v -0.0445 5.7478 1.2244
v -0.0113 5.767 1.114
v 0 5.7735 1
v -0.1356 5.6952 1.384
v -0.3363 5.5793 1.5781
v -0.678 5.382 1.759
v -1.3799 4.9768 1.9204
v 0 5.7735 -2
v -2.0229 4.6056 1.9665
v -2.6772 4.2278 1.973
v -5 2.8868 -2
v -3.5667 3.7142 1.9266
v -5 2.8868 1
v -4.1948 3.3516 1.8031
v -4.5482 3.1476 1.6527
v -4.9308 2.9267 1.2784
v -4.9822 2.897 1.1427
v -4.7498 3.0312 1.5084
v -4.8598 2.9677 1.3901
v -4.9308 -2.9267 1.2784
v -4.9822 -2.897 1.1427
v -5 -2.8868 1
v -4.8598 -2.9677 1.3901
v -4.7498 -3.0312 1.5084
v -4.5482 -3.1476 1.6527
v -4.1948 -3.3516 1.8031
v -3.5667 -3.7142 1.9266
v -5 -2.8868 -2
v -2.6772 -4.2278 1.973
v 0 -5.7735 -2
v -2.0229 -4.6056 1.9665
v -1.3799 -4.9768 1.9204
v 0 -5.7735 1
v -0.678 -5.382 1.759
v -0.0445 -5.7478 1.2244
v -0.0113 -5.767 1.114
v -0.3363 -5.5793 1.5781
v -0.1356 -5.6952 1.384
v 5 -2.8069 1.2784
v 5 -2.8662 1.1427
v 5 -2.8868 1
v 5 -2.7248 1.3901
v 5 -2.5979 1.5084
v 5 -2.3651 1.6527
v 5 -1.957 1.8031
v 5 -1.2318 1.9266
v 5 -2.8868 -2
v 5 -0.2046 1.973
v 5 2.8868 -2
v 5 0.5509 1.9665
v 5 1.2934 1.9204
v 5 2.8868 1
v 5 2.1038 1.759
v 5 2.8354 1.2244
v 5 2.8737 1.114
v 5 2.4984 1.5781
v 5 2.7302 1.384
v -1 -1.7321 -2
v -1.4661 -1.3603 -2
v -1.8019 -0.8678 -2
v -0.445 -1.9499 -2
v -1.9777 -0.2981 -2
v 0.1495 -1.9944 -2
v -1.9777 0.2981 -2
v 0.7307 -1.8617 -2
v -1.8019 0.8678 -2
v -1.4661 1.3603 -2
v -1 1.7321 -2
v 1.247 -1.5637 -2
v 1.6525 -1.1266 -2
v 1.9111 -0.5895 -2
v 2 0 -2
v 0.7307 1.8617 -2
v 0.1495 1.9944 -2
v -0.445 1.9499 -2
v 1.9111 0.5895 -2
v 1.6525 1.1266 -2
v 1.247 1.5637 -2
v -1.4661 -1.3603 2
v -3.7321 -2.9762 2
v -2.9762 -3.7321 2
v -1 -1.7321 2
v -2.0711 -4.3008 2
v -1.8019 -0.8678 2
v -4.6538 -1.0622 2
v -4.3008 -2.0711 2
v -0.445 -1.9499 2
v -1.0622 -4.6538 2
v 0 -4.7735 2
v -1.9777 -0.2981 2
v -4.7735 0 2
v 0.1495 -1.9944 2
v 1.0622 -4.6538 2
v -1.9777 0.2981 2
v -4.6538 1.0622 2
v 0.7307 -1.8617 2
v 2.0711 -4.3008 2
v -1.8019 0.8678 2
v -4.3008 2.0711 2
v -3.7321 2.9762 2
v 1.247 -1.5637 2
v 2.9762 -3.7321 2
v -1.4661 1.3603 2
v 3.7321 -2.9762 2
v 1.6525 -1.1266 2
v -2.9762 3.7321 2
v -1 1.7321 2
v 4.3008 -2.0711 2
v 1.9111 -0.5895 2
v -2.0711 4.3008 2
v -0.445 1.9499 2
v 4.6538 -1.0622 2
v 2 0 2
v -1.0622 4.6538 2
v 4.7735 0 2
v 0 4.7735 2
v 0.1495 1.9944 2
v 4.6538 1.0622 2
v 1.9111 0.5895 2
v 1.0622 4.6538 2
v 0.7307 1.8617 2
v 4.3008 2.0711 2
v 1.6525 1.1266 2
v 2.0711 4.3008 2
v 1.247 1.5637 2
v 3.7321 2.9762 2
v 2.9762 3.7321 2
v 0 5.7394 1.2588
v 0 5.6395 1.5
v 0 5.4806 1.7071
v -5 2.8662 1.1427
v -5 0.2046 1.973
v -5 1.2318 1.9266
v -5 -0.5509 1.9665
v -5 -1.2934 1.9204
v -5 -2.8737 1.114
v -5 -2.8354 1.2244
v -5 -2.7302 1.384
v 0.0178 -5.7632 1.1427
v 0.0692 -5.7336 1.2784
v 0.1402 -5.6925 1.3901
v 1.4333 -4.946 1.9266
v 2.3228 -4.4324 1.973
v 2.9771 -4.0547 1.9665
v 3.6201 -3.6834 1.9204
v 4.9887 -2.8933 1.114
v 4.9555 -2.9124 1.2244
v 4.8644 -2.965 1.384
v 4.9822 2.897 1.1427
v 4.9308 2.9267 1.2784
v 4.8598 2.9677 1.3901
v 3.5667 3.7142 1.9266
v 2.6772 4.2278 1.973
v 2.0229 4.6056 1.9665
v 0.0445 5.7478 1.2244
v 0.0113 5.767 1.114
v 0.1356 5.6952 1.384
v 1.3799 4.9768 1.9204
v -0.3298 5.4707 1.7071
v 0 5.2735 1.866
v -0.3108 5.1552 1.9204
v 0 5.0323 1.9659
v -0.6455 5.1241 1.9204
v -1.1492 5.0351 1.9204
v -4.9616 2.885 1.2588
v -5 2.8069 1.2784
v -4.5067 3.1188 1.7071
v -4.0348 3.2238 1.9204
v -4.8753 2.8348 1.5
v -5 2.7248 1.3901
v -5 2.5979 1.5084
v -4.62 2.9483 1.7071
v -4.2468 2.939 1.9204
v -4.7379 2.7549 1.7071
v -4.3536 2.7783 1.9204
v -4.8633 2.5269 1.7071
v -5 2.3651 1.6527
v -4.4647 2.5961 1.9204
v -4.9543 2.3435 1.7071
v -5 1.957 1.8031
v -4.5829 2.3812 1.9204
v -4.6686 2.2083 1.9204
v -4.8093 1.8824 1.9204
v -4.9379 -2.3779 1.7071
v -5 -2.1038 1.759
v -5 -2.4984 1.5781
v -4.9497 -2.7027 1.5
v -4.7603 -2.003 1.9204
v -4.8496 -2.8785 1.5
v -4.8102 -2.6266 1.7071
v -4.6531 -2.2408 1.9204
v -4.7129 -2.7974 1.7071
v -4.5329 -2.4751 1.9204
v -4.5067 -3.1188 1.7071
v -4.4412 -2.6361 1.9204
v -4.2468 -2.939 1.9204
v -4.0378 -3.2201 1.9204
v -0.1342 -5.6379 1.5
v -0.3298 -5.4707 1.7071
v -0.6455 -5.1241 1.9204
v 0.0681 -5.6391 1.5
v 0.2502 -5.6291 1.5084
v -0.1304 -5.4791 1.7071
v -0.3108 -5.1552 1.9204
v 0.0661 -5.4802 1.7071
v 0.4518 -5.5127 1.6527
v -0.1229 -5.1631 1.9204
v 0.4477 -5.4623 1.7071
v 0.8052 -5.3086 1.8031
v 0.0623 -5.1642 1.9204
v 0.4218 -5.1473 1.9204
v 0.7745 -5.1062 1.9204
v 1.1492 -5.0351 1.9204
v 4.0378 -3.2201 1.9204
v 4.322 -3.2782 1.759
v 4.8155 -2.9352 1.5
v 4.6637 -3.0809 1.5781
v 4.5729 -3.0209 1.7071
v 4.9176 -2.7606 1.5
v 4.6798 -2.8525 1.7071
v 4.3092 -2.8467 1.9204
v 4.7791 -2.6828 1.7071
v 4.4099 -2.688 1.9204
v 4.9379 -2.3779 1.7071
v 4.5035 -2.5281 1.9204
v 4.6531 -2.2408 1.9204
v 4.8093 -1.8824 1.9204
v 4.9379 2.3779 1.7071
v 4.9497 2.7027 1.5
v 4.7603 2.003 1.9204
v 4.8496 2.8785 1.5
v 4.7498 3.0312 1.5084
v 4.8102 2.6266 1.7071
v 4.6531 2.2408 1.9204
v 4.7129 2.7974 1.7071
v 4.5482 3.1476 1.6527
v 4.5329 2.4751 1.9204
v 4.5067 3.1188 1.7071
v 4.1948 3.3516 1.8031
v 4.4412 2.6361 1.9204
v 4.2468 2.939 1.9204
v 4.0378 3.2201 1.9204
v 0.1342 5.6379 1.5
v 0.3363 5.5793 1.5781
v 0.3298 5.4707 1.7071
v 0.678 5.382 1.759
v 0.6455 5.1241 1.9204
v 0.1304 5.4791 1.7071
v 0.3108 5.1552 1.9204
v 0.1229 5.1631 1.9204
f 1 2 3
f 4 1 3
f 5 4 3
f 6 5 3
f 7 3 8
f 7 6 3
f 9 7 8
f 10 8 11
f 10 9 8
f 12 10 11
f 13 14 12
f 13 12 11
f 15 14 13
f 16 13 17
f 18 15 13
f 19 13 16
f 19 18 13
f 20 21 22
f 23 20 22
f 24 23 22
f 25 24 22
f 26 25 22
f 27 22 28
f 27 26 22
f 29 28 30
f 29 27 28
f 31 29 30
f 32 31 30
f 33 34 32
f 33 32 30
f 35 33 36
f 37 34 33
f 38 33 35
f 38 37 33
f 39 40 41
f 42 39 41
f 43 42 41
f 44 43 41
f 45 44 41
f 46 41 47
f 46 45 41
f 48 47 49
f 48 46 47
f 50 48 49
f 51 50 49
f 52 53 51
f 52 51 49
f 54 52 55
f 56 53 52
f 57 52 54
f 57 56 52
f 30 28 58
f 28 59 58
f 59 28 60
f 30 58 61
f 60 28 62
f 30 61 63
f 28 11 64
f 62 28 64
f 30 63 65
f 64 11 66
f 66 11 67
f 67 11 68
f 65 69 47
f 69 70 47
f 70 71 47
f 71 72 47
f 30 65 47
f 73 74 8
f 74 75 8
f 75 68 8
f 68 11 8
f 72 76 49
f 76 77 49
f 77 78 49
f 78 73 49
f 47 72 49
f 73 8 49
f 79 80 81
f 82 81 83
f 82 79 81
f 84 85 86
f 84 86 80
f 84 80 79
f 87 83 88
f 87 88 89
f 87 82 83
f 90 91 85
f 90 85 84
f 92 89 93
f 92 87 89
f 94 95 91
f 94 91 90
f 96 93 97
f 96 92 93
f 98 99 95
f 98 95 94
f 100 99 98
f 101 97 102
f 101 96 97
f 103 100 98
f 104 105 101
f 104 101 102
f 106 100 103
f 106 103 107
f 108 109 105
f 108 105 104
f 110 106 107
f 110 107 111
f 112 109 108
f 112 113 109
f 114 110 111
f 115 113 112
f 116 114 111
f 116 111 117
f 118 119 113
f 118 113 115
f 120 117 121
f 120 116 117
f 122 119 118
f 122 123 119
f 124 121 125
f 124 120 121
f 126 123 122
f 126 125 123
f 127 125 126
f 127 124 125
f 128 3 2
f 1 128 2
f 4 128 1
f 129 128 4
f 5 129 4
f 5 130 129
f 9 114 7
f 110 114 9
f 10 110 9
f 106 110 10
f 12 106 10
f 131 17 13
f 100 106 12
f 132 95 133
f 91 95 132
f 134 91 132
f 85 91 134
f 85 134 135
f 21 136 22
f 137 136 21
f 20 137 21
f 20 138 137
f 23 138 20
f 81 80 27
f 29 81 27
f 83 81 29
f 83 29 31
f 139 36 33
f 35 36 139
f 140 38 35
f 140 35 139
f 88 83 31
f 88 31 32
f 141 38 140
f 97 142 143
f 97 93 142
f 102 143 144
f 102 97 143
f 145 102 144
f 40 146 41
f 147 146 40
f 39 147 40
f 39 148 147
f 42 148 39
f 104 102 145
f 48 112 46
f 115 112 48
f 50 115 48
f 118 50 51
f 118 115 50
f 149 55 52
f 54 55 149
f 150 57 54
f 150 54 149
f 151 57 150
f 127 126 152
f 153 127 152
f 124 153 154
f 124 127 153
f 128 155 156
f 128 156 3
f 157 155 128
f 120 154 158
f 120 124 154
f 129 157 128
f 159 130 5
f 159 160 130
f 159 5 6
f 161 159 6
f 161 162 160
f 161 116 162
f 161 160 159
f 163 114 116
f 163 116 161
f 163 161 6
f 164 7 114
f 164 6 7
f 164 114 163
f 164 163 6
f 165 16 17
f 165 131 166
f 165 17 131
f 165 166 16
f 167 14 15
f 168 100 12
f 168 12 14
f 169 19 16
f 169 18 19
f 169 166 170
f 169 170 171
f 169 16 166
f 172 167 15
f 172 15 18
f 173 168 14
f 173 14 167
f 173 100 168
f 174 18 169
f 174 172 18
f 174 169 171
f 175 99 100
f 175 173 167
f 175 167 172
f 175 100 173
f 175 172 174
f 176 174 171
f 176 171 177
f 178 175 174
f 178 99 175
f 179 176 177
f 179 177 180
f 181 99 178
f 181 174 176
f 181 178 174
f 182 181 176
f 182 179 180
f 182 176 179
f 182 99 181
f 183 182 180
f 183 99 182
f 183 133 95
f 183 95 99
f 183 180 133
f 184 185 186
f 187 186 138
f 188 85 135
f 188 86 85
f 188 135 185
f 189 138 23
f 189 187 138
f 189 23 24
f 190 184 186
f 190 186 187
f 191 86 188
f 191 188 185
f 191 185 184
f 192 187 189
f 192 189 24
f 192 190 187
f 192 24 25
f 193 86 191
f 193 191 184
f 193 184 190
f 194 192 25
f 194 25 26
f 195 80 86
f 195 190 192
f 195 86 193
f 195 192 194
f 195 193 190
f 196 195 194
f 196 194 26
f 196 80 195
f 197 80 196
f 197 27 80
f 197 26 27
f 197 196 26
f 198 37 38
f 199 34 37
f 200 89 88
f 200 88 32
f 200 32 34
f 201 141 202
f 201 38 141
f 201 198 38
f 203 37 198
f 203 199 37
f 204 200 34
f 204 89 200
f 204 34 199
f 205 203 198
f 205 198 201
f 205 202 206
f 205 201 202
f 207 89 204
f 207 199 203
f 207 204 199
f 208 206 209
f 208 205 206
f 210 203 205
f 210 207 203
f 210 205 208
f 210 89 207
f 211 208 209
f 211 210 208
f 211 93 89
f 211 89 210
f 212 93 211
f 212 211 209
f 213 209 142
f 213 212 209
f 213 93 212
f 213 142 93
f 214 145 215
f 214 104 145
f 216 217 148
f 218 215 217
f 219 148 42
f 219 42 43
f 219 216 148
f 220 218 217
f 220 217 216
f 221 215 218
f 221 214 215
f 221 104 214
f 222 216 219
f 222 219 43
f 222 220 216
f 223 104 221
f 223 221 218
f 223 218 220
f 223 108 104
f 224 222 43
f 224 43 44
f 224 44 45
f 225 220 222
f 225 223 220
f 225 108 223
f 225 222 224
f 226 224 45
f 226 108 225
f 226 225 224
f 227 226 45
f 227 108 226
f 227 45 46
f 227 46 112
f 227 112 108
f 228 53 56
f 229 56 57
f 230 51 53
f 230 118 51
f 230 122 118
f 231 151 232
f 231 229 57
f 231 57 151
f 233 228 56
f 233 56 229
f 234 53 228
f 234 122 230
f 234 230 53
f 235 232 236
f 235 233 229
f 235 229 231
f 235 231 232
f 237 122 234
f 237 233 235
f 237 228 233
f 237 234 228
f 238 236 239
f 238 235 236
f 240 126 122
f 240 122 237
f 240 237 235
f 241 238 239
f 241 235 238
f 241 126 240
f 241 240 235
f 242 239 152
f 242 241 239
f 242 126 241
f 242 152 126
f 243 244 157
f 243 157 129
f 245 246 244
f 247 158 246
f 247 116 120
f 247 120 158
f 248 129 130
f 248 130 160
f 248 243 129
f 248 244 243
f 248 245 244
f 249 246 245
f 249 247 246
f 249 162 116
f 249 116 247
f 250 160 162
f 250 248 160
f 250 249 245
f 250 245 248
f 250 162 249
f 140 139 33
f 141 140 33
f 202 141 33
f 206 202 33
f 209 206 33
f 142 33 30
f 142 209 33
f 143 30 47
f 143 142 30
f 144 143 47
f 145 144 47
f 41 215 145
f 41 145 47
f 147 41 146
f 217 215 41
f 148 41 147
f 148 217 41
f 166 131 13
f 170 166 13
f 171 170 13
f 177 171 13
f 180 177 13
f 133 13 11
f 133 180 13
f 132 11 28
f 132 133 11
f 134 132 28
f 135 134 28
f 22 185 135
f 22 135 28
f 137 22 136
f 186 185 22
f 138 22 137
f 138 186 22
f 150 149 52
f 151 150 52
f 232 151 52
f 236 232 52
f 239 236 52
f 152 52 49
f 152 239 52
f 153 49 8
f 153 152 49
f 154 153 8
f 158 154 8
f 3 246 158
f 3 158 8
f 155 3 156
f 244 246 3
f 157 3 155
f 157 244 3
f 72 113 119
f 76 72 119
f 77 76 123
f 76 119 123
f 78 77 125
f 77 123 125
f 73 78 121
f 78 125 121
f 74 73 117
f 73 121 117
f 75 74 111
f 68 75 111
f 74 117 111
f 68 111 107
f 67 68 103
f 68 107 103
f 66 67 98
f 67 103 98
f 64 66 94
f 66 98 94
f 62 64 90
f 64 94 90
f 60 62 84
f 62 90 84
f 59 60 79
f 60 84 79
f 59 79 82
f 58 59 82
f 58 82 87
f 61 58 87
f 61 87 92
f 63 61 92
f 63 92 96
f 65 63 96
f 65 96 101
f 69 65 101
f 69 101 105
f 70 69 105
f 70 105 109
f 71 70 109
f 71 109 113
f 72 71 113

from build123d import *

# Parameters (mm, degrees)
BOSS_EXTRUDE1_DEPTH = 2
SKETCH4_R           = 2
CUT_EXTRUDE1_DEPTH  = 10


with BuildPart() as part:
    # Sketch1 → Boss-Extrude1 (new body, symmetric)
    with BuildSketch(Plane.XY):
        Polygon((0, -5.773502692), (5, -2.886751346), (5, 2.886751346), (0, 5.773502692), (-5, 2.886751346), (-5, -2.886751346), align=None)
    extrude(amount=BOSS_EXTRUDE1_DEPTH, both=True)

    # Sketch3 → Cut-Revolve2 (revolve, cut)
    with BuildSketch(Plane(origin=(0, 0, 0), x_dir=(0, 0, -1), z_dir=(1, 0, 0))):
        with BuildLine():
            Line((-2, 4.773502692), (-3.338978682, 5.429088281))
            Line((-3.338978682, 5.429088281), (-2.142437664, 6.332858624))
            Line((-2.142437664, 6.332858624), (-1, 5.773502692))
            ThreePointArc((-1, 5.773502692), (-1.707106781, 5.480609473), (-2, 4.773502692))
        make_face()
    revolve(axis=Axis((0, 0, 0), (0, 0, 1)), mode=Mode.SUBTRACT)

    # Sketch4 → Cut-Extrude1 (cut)
    with BuildSketch(Plane.XY.offset(2)):
        Circle(SKETCH4_R)
    extrude(amount=-CUT_EXTRUDE1_DEPTH, mode=Mode.SUBTRACT)


solid = part.part
